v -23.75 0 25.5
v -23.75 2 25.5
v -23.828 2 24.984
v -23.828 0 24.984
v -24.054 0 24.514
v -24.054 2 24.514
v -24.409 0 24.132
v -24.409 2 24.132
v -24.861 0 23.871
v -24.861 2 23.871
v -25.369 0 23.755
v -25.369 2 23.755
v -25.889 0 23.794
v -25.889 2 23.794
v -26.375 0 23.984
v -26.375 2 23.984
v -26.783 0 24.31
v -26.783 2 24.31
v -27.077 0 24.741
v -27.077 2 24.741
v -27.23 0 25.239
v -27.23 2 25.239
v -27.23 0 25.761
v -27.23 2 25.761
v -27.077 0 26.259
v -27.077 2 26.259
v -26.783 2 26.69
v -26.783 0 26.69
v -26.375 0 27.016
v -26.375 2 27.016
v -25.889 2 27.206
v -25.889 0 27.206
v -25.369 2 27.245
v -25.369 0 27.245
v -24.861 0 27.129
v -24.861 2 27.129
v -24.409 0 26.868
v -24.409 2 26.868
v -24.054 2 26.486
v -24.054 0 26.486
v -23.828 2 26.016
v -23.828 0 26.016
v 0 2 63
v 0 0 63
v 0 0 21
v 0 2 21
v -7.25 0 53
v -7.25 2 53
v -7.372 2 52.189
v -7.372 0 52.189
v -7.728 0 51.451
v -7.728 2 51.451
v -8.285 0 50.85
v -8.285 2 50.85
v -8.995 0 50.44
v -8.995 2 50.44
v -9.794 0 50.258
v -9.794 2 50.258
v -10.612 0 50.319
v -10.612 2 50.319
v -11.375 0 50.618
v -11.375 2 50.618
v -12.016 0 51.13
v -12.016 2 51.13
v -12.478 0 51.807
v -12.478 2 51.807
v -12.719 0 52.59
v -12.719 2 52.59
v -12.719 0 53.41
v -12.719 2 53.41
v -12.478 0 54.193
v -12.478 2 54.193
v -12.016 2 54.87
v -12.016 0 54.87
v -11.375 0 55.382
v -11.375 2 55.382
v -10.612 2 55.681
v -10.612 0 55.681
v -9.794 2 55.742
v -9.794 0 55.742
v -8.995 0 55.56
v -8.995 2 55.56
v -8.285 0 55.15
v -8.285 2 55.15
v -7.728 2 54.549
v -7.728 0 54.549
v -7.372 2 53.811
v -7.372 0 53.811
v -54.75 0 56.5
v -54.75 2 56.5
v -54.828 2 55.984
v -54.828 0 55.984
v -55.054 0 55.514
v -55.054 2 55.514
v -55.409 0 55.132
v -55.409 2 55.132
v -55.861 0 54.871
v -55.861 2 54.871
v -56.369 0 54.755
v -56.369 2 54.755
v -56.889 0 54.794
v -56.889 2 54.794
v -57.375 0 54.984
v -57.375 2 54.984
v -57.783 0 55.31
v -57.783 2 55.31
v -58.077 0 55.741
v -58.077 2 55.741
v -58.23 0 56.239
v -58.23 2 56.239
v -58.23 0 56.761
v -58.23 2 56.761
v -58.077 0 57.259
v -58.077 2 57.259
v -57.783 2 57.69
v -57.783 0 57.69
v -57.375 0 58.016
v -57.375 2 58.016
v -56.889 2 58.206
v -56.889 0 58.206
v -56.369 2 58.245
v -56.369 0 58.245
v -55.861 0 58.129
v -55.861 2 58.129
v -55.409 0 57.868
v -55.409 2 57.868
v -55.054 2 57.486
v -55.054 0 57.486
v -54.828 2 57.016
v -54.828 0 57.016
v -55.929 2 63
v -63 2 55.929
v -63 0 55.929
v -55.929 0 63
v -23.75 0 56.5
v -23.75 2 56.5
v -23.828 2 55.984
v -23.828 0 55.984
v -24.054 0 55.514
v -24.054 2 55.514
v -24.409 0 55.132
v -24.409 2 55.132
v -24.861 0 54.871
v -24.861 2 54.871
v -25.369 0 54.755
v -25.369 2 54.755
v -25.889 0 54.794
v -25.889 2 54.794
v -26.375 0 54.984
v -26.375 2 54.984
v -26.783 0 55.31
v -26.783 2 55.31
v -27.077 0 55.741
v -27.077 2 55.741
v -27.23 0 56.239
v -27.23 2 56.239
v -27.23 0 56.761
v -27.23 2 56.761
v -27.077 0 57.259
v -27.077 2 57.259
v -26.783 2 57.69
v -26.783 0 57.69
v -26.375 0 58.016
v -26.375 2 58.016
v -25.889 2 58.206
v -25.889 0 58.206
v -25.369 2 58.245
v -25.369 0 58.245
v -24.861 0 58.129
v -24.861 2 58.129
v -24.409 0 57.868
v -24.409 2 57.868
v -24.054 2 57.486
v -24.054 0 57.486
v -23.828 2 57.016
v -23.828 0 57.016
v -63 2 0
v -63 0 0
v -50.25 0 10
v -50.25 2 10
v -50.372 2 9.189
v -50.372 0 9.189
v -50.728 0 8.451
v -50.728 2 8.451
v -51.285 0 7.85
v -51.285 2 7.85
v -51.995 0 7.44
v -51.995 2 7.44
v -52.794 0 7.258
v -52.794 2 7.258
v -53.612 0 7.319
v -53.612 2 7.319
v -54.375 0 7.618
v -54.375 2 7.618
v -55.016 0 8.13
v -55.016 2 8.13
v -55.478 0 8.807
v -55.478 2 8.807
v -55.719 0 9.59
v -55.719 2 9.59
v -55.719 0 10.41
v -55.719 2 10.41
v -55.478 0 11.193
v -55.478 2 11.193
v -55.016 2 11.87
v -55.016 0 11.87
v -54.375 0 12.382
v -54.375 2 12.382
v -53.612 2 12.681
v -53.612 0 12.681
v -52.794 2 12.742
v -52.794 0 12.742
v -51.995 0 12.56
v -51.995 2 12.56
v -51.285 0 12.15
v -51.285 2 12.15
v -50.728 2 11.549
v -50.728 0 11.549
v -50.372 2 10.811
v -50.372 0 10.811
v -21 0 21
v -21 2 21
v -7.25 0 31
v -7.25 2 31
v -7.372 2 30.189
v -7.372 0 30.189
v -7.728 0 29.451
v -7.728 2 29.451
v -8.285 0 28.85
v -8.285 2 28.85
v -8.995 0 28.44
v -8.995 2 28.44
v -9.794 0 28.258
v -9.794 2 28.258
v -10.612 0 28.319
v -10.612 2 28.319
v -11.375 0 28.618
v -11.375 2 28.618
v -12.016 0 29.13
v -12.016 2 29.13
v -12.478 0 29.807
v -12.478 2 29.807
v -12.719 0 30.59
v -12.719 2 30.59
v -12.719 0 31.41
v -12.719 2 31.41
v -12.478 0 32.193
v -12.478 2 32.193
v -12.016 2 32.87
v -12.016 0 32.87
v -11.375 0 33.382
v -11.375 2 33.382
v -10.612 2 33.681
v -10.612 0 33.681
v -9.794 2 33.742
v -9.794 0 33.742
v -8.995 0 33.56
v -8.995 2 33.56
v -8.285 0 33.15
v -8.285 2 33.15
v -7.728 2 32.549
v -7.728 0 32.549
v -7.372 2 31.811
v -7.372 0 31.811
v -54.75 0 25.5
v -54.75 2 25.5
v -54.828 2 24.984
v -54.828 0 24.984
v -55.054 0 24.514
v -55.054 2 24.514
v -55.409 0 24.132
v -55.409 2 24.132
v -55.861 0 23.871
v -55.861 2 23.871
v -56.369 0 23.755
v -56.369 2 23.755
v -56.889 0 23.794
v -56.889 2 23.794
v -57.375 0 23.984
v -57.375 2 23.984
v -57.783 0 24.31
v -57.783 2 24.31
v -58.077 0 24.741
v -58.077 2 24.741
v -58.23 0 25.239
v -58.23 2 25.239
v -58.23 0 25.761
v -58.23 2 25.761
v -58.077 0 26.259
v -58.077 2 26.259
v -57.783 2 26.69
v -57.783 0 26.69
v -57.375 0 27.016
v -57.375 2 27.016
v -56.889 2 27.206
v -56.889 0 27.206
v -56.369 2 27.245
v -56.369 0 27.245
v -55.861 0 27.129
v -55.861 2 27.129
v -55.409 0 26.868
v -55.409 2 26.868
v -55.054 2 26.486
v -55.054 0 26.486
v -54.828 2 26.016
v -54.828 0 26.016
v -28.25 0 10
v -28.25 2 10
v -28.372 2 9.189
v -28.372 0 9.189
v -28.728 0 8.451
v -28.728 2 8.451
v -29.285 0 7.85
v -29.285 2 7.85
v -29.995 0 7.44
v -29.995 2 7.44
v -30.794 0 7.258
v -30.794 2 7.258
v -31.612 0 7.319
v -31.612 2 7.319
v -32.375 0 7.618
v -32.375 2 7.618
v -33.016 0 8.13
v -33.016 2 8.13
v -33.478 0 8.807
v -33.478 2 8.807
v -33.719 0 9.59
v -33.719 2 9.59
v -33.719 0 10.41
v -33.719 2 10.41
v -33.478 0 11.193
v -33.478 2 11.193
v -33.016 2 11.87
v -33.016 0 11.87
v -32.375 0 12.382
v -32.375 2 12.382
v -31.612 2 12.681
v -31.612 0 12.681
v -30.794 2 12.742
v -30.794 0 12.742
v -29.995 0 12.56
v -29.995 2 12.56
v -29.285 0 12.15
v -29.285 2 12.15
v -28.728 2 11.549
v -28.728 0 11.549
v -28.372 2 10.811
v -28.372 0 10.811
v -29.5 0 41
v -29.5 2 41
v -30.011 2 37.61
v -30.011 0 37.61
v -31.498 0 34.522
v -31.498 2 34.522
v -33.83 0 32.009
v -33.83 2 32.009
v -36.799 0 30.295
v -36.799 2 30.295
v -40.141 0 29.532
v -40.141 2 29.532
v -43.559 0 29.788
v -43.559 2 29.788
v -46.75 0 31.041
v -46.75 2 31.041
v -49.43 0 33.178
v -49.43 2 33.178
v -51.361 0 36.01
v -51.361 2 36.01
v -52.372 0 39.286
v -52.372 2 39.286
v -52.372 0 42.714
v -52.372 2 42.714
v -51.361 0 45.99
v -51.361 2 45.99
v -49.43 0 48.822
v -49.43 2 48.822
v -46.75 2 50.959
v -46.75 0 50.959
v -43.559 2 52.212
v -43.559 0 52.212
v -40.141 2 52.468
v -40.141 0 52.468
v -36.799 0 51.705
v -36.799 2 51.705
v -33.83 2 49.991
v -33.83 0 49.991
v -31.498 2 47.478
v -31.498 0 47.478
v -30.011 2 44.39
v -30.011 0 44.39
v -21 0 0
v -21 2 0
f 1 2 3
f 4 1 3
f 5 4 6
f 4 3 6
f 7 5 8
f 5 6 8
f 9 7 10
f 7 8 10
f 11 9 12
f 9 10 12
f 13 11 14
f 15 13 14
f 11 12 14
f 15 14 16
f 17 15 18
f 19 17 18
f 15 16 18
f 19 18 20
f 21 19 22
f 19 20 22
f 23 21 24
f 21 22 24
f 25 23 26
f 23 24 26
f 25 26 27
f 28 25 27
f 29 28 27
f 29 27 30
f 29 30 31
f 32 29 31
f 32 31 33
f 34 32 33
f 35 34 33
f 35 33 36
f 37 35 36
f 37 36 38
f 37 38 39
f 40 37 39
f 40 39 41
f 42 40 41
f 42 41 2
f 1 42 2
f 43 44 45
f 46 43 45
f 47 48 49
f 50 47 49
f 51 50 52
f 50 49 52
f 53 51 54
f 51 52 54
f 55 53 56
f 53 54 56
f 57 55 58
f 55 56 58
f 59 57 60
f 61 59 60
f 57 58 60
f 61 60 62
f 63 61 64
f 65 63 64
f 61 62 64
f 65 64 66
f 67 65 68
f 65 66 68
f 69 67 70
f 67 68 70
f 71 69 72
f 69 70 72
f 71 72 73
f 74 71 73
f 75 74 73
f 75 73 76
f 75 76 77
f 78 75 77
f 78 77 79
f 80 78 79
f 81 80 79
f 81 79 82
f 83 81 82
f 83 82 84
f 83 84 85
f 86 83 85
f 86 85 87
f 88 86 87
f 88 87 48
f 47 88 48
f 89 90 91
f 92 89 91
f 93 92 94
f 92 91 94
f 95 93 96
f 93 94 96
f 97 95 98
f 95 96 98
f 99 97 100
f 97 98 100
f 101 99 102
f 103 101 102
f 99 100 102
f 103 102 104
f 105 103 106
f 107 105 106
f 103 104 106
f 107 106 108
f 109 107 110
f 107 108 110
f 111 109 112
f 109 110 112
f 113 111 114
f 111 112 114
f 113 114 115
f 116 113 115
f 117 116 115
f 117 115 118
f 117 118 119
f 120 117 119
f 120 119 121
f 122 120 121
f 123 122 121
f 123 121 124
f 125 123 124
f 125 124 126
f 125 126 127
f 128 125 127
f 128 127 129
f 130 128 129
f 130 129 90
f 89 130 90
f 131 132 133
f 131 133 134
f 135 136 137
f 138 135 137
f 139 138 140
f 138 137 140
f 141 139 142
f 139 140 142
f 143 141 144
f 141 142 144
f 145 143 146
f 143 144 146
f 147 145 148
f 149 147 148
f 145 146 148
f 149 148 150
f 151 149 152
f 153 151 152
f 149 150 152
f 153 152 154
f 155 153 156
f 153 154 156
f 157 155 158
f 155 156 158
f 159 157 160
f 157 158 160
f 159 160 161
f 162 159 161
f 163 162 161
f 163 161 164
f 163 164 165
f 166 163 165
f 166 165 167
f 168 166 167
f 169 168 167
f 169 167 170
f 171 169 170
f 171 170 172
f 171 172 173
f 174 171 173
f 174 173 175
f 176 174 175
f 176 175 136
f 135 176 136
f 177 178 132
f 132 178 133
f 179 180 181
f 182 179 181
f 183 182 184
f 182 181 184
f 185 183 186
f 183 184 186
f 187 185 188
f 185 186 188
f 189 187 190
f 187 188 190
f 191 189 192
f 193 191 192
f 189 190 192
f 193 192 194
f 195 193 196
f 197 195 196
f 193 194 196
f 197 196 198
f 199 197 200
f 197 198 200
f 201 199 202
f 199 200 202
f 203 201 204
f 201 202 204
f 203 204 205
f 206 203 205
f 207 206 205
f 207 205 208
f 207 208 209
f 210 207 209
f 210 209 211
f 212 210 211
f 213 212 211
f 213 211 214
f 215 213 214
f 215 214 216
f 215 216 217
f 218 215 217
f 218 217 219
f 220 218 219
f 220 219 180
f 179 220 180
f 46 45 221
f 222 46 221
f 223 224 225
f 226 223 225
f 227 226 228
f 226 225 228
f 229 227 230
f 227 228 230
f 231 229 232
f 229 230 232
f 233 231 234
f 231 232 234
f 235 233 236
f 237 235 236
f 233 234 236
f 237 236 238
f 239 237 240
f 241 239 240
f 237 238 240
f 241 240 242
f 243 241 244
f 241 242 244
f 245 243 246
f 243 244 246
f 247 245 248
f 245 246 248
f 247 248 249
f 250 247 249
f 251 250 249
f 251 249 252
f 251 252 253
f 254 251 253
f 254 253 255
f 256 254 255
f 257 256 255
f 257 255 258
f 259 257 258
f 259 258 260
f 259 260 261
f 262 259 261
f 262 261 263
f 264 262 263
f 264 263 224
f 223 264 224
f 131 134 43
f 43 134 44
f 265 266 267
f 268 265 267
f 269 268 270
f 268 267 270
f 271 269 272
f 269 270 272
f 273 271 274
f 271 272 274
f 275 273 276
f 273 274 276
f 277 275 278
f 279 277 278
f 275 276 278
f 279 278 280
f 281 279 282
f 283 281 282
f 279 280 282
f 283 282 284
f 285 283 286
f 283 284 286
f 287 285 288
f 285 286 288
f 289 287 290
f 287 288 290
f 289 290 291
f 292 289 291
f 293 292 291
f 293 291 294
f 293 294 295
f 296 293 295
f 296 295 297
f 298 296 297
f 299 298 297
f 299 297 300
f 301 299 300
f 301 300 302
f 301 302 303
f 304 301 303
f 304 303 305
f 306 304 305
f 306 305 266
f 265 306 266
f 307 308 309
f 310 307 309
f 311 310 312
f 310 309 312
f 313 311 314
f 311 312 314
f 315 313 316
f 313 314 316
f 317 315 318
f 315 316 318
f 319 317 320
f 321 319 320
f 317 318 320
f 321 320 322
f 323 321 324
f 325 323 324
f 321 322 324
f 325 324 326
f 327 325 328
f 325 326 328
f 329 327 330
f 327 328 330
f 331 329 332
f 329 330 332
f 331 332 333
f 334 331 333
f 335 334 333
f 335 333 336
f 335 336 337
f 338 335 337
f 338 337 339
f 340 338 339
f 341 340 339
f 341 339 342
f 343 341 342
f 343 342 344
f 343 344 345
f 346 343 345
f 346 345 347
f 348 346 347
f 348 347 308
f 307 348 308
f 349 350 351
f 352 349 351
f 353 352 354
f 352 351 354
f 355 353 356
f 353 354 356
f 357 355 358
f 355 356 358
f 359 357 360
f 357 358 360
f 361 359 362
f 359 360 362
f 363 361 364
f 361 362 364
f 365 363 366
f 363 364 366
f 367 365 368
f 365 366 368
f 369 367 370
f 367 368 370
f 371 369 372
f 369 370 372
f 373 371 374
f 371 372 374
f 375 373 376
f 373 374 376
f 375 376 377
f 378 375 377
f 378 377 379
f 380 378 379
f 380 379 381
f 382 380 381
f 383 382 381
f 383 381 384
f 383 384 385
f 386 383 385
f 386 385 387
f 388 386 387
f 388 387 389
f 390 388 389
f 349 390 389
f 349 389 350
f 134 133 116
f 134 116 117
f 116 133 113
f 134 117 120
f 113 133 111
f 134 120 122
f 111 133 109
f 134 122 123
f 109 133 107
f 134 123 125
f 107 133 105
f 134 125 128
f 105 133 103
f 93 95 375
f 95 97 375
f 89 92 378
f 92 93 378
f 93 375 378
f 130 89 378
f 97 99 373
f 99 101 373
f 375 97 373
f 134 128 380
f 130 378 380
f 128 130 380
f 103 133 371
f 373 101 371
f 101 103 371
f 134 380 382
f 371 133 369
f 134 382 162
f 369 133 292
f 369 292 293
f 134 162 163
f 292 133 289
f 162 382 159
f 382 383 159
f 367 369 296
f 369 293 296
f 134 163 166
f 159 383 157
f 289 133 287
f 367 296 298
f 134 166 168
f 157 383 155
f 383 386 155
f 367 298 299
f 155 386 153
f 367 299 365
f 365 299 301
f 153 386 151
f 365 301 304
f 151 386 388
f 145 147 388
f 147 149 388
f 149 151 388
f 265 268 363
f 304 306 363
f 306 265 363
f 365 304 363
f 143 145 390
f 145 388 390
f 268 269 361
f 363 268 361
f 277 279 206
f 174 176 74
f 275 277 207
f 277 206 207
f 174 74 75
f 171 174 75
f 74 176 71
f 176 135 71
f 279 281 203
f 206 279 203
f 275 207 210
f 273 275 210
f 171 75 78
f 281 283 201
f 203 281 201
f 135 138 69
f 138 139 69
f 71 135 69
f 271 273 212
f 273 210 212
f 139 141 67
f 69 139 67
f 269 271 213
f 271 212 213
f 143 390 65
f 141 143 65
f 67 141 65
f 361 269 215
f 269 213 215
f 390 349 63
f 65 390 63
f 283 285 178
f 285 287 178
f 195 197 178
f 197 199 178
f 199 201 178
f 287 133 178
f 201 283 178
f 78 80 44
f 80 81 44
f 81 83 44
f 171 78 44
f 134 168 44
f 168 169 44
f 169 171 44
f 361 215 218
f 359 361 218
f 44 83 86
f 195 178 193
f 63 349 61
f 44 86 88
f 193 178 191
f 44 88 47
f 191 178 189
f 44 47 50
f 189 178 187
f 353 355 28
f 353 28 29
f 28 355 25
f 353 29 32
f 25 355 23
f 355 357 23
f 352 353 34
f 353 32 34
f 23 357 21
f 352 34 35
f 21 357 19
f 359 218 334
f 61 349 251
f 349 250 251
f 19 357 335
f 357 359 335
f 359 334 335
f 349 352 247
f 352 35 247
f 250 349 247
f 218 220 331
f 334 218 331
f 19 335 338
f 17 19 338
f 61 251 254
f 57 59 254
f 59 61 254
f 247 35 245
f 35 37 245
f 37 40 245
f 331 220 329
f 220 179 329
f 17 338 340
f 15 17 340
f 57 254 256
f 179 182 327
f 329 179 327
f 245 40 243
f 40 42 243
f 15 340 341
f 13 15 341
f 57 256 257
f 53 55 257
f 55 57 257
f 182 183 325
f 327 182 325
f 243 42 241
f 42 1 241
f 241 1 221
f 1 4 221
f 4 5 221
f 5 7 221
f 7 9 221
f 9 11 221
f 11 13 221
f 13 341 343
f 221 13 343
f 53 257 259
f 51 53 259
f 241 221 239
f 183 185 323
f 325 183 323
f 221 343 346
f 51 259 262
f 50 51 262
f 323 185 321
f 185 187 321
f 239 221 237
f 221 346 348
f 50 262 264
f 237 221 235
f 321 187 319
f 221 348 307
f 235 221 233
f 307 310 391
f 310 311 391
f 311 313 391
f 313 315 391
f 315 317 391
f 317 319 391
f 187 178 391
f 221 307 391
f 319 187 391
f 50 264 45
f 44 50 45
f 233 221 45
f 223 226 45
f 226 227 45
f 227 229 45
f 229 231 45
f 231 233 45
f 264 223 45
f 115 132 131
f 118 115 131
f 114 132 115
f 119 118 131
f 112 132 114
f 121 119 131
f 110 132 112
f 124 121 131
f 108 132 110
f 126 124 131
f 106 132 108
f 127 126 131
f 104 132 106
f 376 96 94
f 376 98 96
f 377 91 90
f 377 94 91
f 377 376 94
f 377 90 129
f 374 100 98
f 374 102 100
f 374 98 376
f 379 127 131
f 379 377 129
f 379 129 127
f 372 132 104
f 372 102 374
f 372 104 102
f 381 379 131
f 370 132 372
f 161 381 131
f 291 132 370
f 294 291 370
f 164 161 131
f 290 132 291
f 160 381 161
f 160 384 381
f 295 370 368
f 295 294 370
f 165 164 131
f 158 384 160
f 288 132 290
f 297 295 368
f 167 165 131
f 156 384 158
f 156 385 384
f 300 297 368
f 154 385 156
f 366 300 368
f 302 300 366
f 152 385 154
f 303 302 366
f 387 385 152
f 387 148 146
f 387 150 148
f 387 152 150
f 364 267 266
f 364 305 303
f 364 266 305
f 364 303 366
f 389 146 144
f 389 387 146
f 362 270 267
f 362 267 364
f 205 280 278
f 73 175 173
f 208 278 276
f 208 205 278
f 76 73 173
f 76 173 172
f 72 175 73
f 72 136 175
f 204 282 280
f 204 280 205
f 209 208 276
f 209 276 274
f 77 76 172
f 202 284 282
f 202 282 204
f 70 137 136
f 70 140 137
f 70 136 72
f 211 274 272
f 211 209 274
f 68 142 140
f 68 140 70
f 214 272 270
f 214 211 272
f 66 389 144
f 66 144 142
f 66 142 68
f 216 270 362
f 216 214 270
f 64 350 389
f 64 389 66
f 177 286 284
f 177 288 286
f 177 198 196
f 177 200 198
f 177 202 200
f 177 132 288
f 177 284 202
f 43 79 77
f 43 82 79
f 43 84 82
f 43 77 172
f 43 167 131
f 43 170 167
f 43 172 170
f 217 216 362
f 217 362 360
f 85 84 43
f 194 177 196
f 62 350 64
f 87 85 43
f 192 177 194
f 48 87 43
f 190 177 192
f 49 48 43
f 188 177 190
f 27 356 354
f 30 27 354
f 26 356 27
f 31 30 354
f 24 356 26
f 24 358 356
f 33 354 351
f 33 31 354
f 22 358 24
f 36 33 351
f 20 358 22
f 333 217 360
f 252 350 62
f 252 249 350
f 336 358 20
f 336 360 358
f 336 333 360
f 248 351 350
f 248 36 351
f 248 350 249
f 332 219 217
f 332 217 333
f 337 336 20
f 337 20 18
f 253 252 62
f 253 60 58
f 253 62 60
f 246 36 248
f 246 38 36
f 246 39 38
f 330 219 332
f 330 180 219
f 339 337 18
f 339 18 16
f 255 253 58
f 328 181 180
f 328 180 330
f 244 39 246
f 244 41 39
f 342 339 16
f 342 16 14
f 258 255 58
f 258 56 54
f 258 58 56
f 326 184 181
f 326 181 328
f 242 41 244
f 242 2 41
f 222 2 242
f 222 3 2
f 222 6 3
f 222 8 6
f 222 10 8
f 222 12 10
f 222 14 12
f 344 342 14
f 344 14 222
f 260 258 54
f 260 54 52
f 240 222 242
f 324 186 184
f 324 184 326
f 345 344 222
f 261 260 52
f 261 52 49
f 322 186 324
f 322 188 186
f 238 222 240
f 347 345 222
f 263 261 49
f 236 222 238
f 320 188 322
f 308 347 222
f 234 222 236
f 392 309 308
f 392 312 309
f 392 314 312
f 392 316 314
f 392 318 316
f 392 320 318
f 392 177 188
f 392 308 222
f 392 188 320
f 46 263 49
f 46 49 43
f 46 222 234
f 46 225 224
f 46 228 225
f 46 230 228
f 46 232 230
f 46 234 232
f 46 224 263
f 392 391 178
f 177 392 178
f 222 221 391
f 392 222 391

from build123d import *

# Parameters (mm, degrees)
EXTRUDE_1_DEPTH     = 2
SKETCH_3_R          = 2.75
SKETCH_3_R_2        = 1.75
SKETCH_3_R_3        = 11.5
CUT_EXTRUDE_1_DEPTH = 3


with BuildPart() as part:
    # 草图1 → 凸台-拉伸1 (new body)
    with BuildSketch(Plane(origin=(0, 0, 0), x_dir=(1, 0, 0), z_dir=(0, 1, 0))):
        Polygon((-63, 0), (-63, -63), (0, -63), (0, -21), (-21, -21), (-21, 0), align=None)
    extrude(amount=EXTRUDE_1_DEPTH)

    # 草图3 → 切除-拉伸1 (cut, through all)
    with BuildSketch(Plane(origin=(0, 2, 0), x_dir=(1, 0, 0), z_dir=(0, 1, 0))):
        with Locations((-53, -10)):
            Circle(SKETCH_3_R)
        with Locations((-56.5, -56.5)):
            Circle(SKETCH_3_R_2)
        with Locations((-25.5, -56.5)):
            Circle(SKETCH_3_R_2)
        with Locations((-25.5, -25.5)):
            Circle(SKETCH_3_R_2)
        with Locations((-56.5, -25.5)):
            Circle(SKETCH_3_R_2)
        with Locations((-41, -41)):
            Circle(SKETCH_3_R_3)
        with Locations((-10, -53)):
            Circle(SKETCH_3_R)
        with Locations((-10, -31)):
            Circle(SKETCH_3_R)
        with Locations((-31, -10)):
            Circle(SKETCH_3_R)
        Polygon((-63, -63), (-63, -55.928932188), (-55.928932188, -63), align=None)
    extrude(amount=-CUT_EXTRUDE_1_DEPTH, mode=Mode.SUBTRACT)


solid = part.part
